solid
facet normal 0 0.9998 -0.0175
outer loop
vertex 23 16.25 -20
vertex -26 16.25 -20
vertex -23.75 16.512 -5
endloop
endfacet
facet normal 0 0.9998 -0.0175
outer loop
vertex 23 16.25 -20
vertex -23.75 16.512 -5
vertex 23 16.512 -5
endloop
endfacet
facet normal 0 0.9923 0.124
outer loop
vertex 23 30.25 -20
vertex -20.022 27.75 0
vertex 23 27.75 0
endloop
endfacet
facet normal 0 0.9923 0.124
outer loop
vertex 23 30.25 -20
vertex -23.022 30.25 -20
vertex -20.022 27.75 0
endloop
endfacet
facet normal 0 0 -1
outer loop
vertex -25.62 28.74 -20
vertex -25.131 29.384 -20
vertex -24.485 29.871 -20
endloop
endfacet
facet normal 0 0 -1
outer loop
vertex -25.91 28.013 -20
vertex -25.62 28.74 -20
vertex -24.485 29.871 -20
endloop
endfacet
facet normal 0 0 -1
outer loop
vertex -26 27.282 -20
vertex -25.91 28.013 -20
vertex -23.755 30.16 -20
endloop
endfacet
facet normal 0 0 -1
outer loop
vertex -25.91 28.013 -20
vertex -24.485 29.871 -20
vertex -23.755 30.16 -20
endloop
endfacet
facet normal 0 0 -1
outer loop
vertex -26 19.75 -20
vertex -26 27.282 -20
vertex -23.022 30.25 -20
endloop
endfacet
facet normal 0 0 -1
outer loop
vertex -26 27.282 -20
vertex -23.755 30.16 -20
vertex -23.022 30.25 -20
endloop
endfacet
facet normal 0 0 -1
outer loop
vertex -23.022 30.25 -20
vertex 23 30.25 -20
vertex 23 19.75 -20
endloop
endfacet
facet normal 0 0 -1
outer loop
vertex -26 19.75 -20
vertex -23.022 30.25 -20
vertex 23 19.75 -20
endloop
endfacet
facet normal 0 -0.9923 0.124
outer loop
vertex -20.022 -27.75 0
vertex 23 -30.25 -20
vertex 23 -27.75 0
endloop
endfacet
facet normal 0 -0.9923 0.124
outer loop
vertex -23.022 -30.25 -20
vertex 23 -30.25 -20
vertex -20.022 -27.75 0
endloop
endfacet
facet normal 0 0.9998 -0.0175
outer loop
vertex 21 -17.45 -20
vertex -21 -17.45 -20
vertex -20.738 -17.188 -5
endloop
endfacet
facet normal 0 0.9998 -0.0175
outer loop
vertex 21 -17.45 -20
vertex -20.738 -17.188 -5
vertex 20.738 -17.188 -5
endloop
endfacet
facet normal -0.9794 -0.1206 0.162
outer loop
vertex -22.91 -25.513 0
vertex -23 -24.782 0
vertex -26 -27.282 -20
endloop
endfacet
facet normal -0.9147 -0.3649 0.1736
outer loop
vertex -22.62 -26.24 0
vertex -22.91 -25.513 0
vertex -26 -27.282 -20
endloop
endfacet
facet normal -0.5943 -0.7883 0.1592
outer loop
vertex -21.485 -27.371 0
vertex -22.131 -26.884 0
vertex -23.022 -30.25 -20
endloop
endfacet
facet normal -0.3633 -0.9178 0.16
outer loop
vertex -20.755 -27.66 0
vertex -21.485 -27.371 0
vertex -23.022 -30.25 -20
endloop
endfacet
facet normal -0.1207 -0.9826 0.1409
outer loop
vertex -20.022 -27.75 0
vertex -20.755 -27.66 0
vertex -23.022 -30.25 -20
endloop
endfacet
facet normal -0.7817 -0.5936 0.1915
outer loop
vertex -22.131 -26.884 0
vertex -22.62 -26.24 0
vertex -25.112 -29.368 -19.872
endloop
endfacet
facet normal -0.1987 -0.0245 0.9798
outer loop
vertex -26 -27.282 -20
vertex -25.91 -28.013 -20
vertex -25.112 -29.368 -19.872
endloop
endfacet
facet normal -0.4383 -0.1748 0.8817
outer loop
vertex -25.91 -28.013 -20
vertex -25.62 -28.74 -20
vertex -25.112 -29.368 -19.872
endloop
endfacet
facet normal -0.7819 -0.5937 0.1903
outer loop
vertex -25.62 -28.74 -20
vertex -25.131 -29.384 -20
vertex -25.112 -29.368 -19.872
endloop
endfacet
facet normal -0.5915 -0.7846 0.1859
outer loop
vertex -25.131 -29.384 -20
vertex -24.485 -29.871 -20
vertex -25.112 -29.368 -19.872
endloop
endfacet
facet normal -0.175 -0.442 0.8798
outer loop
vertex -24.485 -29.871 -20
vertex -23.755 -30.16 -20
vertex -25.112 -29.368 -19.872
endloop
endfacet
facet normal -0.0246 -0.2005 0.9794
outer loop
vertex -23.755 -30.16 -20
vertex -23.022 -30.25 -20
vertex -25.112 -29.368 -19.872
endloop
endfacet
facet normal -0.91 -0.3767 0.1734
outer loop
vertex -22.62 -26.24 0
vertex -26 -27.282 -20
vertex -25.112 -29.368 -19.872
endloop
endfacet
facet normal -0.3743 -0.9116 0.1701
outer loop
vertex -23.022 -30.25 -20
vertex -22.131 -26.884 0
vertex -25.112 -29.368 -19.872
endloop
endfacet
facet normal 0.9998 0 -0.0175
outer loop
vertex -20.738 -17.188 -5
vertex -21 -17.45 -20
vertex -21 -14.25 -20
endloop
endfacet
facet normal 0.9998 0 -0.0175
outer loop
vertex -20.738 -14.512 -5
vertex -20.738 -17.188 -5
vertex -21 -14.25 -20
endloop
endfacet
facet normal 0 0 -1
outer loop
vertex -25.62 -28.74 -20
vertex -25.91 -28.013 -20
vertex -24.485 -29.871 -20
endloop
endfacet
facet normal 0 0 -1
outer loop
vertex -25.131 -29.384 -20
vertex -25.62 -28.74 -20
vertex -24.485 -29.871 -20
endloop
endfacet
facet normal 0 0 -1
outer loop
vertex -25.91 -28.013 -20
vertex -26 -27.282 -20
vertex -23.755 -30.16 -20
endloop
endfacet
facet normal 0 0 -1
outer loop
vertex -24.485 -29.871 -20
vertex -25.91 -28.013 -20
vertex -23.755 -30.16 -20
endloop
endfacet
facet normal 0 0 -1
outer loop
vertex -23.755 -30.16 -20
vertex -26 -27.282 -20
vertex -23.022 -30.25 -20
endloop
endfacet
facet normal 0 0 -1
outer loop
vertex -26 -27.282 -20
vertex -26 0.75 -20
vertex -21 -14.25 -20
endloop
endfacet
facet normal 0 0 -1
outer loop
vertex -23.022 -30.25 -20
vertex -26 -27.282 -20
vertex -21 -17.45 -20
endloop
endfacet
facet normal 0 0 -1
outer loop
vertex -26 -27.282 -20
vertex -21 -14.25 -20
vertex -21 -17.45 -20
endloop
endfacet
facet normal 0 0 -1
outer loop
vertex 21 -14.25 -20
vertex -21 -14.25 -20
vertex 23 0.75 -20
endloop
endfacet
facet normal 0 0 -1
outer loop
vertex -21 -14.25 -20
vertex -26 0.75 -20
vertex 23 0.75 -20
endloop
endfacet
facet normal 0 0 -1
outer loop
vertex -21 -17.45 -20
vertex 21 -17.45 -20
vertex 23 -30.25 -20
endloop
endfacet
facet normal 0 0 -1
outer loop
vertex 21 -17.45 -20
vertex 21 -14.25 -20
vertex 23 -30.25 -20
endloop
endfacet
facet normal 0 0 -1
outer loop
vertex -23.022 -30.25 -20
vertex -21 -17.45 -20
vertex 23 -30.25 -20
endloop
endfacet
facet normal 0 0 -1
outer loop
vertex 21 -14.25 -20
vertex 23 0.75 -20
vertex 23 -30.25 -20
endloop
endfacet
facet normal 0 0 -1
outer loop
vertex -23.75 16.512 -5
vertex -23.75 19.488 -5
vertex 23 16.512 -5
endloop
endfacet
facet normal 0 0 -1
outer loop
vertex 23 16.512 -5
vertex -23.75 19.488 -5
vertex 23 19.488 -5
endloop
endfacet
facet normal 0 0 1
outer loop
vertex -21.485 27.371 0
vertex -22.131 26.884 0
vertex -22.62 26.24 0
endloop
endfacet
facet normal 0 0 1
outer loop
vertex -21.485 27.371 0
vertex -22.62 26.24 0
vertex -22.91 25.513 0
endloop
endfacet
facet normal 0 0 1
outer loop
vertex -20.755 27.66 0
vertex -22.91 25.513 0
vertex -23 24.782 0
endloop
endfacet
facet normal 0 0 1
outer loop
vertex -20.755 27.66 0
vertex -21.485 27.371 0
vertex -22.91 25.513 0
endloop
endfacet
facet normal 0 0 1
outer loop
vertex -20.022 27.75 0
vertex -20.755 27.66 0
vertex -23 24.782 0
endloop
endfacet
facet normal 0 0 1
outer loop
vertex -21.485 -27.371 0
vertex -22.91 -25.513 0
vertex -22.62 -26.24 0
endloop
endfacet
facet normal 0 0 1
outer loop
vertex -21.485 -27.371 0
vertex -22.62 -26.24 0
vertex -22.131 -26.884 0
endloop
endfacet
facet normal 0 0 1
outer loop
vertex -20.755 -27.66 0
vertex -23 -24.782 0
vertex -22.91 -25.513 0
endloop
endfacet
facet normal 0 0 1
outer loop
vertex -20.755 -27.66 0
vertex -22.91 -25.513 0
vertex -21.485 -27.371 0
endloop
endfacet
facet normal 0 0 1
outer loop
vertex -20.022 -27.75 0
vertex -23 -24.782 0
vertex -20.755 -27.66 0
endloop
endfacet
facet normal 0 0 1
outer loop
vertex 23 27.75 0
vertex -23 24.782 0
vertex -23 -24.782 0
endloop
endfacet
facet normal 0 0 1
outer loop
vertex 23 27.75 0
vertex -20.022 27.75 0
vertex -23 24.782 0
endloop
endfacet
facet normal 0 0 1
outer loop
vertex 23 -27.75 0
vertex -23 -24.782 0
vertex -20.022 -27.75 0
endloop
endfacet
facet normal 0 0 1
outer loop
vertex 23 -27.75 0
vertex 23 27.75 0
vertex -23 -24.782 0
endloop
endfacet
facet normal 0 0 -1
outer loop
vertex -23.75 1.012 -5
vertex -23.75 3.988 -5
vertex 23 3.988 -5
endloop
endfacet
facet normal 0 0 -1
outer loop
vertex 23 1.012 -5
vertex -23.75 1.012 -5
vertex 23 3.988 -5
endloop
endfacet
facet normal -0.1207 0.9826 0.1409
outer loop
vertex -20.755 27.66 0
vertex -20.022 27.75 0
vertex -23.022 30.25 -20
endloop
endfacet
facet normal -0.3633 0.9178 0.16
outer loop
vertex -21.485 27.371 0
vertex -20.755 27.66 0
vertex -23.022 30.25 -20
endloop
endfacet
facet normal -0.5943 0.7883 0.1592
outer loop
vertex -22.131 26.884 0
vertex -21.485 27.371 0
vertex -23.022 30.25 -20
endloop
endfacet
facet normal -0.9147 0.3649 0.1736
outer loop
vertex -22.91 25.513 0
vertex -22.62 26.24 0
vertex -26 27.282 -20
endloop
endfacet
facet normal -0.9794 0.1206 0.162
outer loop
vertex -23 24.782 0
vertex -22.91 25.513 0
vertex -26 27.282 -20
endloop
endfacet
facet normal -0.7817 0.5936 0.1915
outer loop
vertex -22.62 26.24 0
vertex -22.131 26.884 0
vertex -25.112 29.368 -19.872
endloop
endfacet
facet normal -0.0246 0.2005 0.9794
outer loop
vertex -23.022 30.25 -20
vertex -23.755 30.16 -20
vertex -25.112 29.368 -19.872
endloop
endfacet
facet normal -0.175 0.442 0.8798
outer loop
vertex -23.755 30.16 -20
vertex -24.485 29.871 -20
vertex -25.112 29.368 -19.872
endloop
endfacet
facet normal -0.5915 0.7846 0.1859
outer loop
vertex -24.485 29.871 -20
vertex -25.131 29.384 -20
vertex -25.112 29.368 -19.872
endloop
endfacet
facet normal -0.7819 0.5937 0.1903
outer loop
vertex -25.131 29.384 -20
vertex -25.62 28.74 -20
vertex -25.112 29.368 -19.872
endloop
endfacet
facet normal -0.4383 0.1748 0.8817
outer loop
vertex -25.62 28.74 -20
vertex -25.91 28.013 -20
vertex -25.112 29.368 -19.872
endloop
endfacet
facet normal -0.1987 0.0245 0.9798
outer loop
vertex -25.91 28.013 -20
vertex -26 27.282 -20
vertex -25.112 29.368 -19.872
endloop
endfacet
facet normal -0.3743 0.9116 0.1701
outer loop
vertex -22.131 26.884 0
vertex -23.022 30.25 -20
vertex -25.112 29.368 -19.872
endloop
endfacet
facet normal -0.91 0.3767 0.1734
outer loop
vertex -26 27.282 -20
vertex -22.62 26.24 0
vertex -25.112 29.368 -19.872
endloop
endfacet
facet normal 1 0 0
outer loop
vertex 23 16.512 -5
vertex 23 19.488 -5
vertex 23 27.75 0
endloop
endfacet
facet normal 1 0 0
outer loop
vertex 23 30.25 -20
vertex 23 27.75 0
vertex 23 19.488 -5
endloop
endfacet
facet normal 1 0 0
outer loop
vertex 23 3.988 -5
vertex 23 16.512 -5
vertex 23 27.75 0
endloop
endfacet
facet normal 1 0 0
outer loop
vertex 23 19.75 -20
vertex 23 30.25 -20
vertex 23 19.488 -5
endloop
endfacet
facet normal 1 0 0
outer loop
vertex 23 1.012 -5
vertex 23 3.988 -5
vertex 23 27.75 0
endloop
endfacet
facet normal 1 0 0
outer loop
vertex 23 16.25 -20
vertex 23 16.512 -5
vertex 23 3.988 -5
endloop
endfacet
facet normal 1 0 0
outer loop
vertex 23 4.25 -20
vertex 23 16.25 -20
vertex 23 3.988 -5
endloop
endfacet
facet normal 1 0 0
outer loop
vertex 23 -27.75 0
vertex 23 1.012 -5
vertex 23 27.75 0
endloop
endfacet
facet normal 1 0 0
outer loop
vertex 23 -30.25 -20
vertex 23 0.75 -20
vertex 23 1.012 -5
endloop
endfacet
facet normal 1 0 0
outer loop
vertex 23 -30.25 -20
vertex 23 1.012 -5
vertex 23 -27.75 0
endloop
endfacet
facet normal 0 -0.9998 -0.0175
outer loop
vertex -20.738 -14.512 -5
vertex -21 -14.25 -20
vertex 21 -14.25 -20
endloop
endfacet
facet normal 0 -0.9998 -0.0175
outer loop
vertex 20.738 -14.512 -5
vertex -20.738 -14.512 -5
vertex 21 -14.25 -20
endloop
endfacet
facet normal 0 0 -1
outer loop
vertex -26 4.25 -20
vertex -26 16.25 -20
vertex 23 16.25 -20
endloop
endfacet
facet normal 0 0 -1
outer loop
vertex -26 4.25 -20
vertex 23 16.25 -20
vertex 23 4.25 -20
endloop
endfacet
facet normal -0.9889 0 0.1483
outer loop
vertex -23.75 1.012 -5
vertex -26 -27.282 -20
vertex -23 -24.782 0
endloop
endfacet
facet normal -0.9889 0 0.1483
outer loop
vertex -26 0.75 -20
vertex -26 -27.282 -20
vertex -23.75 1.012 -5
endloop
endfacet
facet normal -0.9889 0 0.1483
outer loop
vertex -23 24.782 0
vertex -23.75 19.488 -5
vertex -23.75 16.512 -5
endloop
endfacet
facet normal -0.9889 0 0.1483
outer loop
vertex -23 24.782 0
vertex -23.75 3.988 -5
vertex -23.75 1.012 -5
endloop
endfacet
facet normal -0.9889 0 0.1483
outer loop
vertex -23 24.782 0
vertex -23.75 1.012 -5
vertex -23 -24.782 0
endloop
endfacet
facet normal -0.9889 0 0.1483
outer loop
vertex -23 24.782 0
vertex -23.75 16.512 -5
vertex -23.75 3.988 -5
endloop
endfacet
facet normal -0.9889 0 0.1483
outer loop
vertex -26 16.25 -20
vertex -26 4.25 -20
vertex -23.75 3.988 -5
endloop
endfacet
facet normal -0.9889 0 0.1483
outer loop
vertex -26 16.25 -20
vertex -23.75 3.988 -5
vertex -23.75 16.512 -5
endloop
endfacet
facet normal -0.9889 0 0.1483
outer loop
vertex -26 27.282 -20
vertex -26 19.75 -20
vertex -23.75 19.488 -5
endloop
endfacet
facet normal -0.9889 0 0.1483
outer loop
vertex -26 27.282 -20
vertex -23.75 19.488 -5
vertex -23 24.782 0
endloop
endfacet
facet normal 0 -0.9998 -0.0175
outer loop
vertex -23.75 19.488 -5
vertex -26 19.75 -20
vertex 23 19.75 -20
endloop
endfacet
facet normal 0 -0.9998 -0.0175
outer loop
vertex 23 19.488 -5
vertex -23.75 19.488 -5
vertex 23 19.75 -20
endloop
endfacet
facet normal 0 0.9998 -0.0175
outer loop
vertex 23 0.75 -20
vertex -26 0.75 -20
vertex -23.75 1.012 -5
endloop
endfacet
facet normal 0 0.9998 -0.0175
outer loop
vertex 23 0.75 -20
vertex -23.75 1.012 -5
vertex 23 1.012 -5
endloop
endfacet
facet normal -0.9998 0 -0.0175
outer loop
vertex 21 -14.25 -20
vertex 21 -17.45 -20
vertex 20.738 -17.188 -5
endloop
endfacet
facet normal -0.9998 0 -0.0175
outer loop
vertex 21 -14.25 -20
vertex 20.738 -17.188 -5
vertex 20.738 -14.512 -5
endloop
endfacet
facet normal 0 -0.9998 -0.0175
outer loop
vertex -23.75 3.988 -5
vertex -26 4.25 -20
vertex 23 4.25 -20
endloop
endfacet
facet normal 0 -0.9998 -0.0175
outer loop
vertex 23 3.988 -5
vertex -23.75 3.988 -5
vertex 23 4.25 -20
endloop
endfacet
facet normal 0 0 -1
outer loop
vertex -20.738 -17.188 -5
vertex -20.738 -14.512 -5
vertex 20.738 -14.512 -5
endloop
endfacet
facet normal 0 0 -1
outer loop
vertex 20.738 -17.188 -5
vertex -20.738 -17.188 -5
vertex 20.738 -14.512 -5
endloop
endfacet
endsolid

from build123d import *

# Parameters (mm, degrees)
ESQUISSE3_W                       = 60.424633044
ESQUISSE3_H                       = 3.5
ENL_V_MAT_EXTRU_3_DEPTH           = 15
ENL_V_MAT_EXTRU_3_DRAFT           = 1
ENL_V_MAT_EXTRU_3_PROFILE_2_DEPTH = 15
ENL_V_MAT_EXTRU_3_PROFILE_2_DRAFT = 1
ESQUISSE3_W_2                     = 42
ESQUISSE3_H_2                     = 3.2
ENL_V_MAT_EXTRU_3_PROFILE_3_DEPTH = 15
ENL_V_MAT_EXTRU_3_PROFILE_3_DRAFT = 1
CONG_1_R                          = 3


with BuildPart() as part:
    # Esquisse1 → Lissage1 section 0
    with BuildSketch(Plane.XY):
        with BuildLine():
            Line((-23, 27.75), (23, 27.75))
            Line((23, 27.75), (23, -27.75))
            Line((23, -27.75), (-23, -27.75))
            Line((-23, -27.75), (-23, 27.75))
        make_face()
    # Esquisse2 → Lissage1 section 1
    with BuildSketch(Plane.XY.offset(-20)):
        with BuildLine():
            Line((-26, 30.25), (23, 30.25))
            Line((23, 30.25), (23, -30.25))
            Line((23, -30.25), (-26, -30.25))
            Line((-26, -30.25), (-26, 30.25))
        make_face()
    loft()


with BuildPart() as enl_v_mat_extru_3_tool:
    # Esquisse3 → Enlèv. mat.-Extru.3 (with draft: the straight prism first)
    with BuildSketch(Plane.XY.offset(-20)):
        with Locations((-0.930868515, 2.5)):
            Rectangle(ESQUISSE3_W, ESQUISSE3_H)
    extrude(amount=ENL_V_MAT_EXTRU_3_DEPTH)
    # Enlèv. mat.-Extru.3: the draft: its side faces are tilted about the plane it starts from
    enl_v_mat_extru_3_sides = [enl_v_mat_extru_3_tool.faces().sort_by_distance(p)[0] for p in [
        (-0.930868515, 0.75, -12.5),
        (29.281448007, 2.5, -12.5),
        (-0.930868515, 4.25, -12.5),
        (-31.143185037, 2.5, -12.5),
    ]]
    draft(enl_v_mat_extru_3_sides, Plane.XY.offset(-20), ENL_V_MAT_EXTRU_3_DRAFT)


with BuildPart() as part_1:
    add(part.part)

    # Enlèv. mat.-Extru.3: cut by enl_v_mat_extru_3_tool
    add(enl_v_mat_extru_3_tool.part, mode=Mode.SUBTRACT)


with BuildPart() as enl_v_mat_extru_3_profile_2_tool:
    # Esquisse3 → Enlèv. mat.-Extru.3 profile 2 (with draft: the straight prism first)
    with BuildSketch(Plane.XY.offset(-20)):
        with Locations((-2.538455813, 18)):
            Rectangle(ESQUISSE3_W, ESQUISSE3_H)
    extrude(amount=ENL_V_MAT_EXTRU_3_PROFILE_2_DEPTH)
    # Enlèv. mat.-Extru.3 profile 2: the draft: its side faces are tilted about the plane it starts from
    enl_v_mat_extru_3_profile_2_sides = [enl_v_mat_extru_3_profile_2_tool.faces().sort_by_distance(p)[0] for p in [
        (-2.538455813, 16.25, -12.5),
        (27.673860709, 18, -12.5),
        (-2.538455813, 19.75, -12.5),
        (-32.750772335, 18, -12.5),
    ]]
    draft(enl_v_mat_extru_3_profile_2_sides, Plane.XY.offset(-20), ENL_V_MAT_EXTRU_3_PROFILE_2_DRAFT)


with BuildPart() as part_2:
    add(part_1.part)

    # Enlèv. mat.-Extru.3 profile 2: cut by enl_v_mat_extru_3_profile_2_tool
    add(enl_v_mat_extru_3_profile_2_tool.part, mode=Mode.SUBTRACT)


with BuildPart() as enl_v_mat_extru_3_profile_3_tool:
    # Esquisse3 → Enlèv. mat.-Extru.3 profile 3 (with draft: the straight prism first)
    with BuildSketch(Plane.XY.offset(-20)):
        with Locations((0, -15.85)):
            Rectangle(ESQUISSE3_W_2, ESQUISSE3_H_2)
    extrude(amount=ENL_V_MAT_EXTRU_3_PROFILE_3_DEPTH)
    # Enlèv. mat.-Extru.3 profile 3: the draft: its side faces are tilted about the plane it starts from
    enl_v_mat_extru_3_profile_3_sides = [enl_v_mat_extru_3_profile_3_tool.faces().sort_by_distance(p)[0] for p in [
        (0, -17.45, -12.5),
        (21, -15.85, -12.5),
        (0, -14.25, -12.5),
        (-21, -15.85, -12.5),
    ]]
    draft(enl_v_mat_extru_3_profile_3_sides, Plane.XY.offset(-20), ENL_V_MAT_EXTRU_3_PROFILE_3_DRAFT)


with BuildPart() as part_3:
    add(part_2.part)

    # Enlèv. mat.-Extru.3 profile 3: cut by enl_v_mat_extru_3_profile_3_tool
    add(enl_v_mat_extru_3_profile_3_tool.part, mode=Mode.SUBTRACT)

    # Congé1
    cong_1_edges = [part_3.edges().sort_by_distance(p)[0] for p in [
        (-24.5, 29, -10),
        (-24.5, -29, -10),
    ]]
    fillet(cong_1_edges, radius=CONG_1_R)


solid = part_3.part
